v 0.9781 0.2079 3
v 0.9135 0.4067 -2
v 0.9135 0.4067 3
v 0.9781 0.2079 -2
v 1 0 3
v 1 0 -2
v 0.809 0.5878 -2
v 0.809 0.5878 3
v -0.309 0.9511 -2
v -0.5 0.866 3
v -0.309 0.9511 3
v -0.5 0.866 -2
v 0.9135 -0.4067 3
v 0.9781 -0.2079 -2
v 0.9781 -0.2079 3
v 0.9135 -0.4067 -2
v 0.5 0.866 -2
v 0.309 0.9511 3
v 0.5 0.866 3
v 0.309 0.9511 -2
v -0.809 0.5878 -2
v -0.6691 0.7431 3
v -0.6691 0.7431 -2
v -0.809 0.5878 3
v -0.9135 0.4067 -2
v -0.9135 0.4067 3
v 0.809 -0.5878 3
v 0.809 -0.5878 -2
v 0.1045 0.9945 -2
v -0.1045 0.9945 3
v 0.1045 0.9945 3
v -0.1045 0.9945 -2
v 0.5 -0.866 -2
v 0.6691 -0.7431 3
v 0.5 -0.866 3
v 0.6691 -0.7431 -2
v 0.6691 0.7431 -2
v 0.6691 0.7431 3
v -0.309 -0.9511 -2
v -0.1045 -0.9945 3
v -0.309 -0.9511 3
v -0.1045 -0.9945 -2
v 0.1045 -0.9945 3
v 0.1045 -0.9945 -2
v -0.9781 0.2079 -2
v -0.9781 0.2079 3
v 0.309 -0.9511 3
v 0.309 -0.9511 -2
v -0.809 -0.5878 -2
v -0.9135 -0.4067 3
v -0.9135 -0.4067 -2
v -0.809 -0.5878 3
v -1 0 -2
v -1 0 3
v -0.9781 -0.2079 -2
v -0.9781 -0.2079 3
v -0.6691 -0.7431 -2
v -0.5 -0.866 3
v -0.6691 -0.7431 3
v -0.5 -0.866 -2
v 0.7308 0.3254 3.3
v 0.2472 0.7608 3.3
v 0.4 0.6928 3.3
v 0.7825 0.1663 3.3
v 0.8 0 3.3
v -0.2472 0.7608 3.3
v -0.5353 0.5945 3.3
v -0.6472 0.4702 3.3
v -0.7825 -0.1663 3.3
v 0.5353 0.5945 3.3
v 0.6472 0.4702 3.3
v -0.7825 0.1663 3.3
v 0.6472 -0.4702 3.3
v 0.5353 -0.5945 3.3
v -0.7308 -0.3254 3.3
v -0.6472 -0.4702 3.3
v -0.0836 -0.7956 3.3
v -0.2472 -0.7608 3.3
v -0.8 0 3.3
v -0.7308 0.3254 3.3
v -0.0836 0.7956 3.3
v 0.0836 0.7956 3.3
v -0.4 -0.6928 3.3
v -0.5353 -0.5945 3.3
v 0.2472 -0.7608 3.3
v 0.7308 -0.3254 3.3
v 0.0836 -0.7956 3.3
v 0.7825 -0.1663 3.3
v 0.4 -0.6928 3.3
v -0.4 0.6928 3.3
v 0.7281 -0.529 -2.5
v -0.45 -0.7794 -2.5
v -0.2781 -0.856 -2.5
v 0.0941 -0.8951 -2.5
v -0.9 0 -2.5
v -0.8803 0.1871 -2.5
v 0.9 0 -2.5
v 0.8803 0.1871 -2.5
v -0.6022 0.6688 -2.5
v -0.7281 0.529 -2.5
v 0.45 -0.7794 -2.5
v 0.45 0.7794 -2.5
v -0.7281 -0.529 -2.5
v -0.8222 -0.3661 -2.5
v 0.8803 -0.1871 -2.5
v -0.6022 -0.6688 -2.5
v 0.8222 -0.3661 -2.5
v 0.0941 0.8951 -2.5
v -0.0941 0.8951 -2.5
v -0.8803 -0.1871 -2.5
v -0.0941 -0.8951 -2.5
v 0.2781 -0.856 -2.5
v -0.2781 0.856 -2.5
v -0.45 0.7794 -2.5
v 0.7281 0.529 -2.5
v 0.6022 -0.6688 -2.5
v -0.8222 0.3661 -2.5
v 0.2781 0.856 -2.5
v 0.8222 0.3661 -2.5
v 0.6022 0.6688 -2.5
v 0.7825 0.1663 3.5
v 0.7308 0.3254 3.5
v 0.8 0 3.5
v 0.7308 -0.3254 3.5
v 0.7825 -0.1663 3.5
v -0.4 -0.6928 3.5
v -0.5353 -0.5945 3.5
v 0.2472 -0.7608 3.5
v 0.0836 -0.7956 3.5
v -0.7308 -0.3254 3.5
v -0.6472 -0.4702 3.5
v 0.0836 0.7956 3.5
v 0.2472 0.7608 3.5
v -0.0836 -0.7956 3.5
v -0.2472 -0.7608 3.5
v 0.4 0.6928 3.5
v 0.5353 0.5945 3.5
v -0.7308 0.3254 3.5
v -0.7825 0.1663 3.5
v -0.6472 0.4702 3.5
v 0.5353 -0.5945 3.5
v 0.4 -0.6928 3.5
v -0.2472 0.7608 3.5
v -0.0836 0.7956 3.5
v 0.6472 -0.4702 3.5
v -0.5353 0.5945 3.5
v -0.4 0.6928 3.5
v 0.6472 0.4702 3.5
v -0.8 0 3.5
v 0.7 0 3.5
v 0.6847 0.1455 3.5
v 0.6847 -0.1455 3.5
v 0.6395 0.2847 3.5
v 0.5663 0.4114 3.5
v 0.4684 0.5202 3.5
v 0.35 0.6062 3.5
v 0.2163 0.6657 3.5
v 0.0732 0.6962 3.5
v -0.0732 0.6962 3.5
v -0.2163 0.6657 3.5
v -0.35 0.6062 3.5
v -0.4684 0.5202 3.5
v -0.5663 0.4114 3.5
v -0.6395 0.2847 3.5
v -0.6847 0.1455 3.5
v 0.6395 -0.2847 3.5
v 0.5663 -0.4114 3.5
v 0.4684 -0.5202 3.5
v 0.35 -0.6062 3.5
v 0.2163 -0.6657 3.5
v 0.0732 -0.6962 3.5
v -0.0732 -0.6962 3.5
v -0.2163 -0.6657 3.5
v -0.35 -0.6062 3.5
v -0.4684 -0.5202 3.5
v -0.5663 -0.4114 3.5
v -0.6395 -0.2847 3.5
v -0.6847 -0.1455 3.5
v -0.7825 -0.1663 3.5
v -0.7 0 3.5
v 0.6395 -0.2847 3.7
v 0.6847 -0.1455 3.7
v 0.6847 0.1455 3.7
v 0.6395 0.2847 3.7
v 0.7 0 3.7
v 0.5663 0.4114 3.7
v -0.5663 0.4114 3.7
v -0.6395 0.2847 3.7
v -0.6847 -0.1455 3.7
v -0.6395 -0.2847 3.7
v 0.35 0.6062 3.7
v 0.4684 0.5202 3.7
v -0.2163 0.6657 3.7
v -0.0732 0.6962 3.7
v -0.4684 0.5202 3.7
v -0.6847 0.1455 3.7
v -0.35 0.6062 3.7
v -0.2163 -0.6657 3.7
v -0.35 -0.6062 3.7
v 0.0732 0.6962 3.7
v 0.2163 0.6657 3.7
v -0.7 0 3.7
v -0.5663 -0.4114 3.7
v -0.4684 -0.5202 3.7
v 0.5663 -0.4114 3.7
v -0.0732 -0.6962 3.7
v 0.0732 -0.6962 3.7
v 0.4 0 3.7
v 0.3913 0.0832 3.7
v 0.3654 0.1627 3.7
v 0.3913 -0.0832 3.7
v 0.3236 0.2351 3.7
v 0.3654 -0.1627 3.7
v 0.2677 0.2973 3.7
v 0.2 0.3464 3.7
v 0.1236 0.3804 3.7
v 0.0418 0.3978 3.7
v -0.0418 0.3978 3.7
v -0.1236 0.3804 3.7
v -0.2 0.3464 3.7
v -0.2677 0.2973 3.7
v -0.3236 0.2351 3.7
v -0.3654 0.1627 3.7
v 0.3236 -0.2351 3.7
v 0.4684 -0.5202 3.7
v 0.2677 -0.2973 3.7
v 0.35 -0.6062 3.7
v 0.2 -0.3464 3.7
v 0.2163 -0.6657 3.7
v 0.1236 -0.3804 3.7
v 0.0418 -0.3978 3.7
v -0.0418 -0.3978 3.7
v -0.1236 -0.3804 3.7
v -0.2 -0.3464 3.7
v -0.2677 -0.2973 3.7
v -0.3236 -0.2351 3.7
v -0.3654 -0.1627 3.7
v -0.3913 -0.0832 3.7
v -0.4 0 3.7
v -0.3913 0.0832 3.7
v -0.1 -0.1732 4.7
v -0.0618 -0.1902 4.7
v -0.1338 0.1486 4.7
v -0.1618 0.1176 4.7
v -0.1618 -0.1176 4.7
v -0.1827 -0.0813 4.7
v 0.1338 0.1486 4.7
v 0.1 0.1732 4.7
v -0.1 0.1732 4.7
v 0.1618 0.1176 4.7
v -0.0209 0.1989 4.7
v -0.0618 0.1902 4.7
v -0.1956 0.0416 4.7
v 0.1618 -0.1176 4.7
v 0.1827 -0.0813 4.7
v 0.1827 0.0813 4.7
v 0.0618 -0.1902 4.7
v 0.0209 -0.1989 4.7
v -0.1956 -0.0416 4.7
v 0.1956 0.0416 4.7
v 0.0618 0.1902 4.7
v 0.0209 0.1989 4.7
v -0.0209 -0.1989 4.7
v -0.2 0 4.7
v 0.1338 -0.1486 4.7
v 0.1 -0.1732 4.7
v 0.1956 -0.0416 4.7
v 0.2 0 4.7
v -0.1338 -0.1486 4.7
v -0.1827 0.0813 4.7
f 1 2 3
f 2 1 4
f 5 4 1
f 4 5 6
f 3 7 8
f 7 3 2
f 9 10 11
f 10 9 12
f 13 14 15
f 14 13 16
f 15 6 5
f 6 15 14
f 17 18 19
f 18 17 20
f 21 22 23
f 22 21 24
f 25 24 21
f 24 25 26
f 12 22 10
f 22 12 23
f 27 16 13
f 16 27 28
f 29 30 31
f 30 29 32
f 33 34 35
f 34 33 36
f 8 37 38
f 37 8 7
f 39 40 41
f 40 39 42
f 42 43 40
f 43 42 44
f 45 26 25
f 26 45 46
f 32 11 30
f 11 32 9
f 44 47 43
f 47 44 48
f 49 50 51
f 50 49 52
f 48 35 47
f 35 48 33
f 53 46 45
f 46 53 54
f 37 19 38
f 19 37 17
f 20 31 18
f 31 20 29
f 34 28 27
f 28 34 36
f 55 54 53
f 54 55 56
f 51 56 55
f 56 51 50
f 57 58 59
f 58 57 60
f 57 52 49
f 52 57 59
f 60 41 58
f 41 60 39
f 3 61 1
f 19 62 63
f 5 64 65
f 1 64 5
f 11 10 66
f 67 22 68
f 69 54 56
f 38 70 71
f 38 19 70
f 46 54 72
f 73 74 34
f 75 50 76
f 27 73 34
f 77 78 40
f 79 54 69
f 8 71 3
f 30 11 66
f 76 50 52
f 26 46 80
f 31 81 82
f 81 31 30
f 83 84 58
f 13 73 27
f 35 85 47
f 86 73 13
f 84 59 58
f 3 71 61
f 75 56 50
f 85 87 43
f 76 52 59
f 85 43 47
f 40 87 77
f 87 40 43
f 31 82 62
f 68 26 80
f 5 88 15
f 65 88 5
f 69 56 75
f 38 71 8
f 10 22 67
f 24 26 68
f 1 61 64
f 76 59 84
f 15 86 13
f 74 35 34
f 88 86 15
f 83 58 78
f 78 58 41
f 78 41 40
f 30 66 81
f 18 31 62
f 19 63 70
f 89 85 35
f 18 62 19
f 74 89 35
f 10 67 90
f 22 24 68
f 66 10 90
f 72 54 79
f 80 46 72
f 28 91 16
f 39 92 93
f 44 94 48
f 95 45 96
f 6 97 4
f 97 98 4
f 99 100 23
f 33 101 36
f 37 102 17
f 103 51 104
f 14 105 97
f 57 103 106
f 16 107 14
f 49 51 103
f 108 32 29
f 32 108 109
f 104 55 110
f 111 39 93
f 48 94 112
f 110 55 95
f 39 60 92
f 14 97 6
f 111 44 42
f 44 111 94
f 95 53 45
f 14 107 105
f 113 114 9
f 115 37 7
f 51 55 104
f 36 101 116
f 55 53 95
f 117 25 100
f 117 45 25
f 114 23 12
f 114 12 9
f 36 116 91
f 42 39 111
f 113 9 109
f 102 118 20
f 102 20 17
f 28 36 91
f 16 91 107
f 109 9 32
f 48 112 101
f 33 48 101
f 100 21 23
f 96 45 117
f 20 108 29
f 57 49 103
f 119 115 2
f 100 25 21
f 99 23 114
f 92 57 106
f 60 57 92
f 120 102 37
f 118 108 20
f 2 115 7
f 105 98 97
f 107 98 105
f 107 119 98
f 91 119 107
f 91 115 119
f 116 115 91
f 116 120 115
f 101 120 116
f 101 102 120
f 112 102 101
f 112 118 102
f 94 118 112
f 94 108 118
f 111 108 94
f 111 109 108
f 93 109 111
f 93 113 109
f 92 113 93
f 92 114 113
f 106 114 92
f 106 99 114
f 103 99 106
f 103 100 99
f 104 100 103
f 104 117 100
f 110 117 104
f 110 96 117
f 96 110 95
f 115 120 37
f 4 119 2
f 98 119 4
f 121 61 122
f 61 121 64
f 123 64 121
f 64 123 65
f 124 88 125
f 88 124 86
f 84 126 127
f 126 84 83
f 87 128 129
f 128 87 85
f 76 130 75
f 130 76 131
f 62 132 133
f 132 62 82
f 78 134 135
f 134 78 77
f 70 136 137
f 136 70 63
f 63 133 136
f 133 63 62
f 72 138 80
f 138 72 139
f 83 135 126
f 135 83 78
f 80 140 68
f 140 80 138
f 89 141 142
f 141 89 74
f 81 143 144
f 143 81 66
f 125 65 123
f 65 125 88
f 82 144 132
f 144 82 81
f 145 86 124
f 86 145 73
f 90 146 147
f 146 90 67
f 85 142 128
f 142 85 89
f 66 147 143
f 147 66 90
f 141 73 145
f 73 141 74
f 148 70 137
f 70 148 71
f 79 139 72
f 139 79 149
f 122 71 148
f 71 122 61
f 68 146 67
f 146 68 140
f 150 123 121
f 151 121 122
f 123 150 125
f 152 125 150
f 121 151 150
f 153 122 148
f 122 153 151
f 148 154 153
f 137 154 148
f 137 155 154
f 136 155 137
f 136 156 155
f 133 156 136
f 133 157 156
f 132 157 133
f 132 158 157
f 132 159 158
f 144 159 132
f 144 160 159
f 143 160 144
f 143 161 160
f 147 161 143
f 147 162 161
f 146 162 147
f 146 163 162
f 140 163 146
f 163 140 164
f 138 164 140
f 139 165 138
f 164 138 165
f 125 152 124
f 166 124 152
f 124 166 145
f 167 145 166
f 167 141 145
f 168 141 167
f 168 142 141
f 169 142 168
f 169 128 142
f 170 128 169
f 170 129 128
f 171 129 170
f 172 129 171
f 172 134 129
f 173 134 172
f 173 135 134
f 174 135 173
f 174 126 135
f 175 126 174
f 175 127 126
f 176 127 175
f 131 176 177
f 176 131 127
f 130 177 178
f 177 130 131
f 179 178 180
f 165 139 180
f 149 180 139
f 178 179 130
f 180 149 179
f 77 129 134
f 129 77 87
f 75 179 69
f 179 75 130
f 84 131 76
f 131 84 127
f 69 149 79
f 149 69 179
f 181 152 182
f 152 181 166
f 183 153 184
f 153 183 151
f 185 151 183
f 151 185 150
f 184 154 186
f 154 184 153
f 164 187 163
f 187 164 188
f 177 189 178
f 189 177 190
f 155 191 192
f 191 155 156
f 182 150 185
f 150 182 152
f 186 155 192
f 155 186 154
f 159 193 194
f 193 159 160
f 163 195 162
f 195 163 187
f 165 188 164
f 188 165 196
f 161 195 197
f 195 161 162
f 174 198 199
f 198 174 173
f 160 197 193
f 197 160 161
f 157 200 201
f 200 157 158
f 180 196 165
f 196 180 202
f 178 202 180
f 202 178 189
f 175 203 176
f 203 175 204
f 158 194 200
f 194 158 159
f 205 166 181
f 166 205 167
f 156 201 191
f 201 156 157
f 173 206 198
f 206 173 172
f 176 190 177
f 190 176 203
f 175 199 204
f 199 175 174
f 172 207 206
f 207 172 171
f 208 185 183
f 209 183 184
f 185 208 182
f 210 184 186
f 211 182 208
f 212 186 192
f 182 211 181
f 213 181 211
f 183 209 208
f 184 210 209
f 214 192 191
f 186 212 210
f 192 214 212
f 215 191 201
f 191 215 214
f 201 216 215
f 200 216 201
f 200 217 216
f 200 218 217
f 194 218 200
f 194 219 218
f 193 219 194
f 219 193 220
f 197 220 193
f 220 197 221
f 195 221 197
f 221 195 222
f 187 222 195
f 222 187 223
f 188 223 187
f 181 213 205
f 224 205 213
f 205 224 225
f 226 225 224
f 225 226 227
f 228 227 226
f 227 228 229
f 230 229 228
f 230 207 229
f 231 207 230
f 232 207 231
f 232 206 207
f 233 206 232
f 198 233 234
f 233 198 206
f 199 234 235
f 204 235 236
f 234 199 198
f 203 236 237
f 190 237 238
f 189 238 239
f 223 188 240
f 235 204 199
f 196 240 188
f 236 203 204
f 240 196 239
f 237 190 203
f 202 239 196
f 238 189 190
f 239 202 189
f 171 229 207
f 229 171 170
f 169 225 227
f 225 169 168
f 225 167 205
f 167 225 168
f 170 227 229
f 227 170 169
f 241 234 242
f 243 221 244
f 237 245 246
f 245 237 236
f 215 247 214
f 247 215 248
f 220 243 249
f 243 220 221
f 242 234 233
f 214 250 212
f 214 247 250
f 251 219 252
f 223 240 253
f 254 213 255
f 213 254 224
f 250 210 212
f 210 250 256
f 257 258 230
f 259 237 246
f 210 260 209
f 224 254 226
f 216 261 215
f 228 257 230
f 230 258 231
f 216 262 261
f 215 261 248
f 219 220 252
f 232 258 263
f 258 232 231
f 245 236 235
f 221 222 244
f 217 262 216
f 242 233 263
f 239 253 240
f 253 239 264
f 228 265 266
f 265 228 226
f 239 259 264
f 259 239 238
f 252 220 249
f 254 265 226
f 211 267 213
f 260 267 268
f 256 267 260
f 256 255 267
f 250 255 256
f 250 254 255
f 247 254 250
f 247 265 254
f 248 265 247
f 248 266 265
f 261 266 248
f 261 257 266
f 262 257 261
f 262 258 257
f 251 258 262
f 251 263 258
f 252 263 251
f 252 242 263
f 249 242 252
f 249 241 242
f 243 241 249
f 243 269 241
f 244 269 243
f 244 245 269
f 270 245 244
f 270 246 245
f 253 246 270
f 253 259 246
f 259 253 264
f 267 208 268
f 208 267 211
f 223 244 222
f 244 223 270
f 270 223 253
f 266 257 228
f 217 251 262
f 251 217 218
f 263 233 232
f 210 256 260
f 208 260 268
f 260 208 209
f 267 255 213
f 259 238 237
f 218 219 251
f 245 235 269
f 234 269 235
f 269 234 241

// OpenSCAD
module Sauce_Bottle(Mat = 0){

    Ketchup = "#ec0606"; 
    Mayonnaise = "#ffffee";
    Mustard = "#e5c54f";

    Material = [Ketchup,Mayonnaise,Mustard];

    color(Material[Mat]){
    translate([0,0,0.5])
    cylinder(5, 1,1, $fn = 30, center = true);

    translate([0,0,3])
    cylinder(0.3, 1,0.8, $fn = 30);

    translate([0,0,-2.5])
    cylinder(0.5,0.9,1, $fn = 30);
    }

    color("#f9f2f2"){
    translate([0,0,3.3])
    cylinder(0.2, 0.8,0.8, $fn = 30);
    }

    color("#f9f2f2"){
    translate([0,0,3.5])
    cylinder(0.2, 0.7,0.7, $fn = 30);
    }

    color("#f9f2f2"){
    translate([0,0,3.7])
    cylinder(1, 0.4,0.2, $fn = 30);
    }

}

Sauce_Bottle(2);

// Written by Nicolì Angelo (Gengio) 2024: 
// MIT License

//Permission is hereby granted, free of charge, to any person obtaining a copy of this software and associated documentation files (the "Software"), to deal in the Software without restriction, including without limitation the rights to use, copy, modify, merge, publish, distribute, sublicense, and/or sell copies of the Software, and to permit persons to whom the Software is furnished to do so, subject to the following conditions:

//The above copyright notice and this permission notice shall be included in all copies or substantial portions of the Software.

//THE SOFTWARE IS PROVIDED "AS IS", WITHOUT WARRANTY OF ANY KIND, EXPRESS OR IMPLIED, INCLUDING BUT NOT LIMITED TO THE WARRANTIES OF MERCHANTABILITY, FITNESS FOR A PARTICULAR PURPOSE AND NONINFRINGEMENT. IN NO EVENT SHALL THE AUTHORS OR COPYRIGHT HOLDERS BE LIABLE FOR ANY CLAIM, DAMAGES OR OTHER LIABILITY, WHETHER IN AN ACTION OF CONTRACT, TORT OR OTHERWISE, ARISING FROM, OUT OF OR IN CONNECTION WITH THE SOFTWARE OR THE USE OR OTHER DEALINGS IN THE SOFTWARE.
